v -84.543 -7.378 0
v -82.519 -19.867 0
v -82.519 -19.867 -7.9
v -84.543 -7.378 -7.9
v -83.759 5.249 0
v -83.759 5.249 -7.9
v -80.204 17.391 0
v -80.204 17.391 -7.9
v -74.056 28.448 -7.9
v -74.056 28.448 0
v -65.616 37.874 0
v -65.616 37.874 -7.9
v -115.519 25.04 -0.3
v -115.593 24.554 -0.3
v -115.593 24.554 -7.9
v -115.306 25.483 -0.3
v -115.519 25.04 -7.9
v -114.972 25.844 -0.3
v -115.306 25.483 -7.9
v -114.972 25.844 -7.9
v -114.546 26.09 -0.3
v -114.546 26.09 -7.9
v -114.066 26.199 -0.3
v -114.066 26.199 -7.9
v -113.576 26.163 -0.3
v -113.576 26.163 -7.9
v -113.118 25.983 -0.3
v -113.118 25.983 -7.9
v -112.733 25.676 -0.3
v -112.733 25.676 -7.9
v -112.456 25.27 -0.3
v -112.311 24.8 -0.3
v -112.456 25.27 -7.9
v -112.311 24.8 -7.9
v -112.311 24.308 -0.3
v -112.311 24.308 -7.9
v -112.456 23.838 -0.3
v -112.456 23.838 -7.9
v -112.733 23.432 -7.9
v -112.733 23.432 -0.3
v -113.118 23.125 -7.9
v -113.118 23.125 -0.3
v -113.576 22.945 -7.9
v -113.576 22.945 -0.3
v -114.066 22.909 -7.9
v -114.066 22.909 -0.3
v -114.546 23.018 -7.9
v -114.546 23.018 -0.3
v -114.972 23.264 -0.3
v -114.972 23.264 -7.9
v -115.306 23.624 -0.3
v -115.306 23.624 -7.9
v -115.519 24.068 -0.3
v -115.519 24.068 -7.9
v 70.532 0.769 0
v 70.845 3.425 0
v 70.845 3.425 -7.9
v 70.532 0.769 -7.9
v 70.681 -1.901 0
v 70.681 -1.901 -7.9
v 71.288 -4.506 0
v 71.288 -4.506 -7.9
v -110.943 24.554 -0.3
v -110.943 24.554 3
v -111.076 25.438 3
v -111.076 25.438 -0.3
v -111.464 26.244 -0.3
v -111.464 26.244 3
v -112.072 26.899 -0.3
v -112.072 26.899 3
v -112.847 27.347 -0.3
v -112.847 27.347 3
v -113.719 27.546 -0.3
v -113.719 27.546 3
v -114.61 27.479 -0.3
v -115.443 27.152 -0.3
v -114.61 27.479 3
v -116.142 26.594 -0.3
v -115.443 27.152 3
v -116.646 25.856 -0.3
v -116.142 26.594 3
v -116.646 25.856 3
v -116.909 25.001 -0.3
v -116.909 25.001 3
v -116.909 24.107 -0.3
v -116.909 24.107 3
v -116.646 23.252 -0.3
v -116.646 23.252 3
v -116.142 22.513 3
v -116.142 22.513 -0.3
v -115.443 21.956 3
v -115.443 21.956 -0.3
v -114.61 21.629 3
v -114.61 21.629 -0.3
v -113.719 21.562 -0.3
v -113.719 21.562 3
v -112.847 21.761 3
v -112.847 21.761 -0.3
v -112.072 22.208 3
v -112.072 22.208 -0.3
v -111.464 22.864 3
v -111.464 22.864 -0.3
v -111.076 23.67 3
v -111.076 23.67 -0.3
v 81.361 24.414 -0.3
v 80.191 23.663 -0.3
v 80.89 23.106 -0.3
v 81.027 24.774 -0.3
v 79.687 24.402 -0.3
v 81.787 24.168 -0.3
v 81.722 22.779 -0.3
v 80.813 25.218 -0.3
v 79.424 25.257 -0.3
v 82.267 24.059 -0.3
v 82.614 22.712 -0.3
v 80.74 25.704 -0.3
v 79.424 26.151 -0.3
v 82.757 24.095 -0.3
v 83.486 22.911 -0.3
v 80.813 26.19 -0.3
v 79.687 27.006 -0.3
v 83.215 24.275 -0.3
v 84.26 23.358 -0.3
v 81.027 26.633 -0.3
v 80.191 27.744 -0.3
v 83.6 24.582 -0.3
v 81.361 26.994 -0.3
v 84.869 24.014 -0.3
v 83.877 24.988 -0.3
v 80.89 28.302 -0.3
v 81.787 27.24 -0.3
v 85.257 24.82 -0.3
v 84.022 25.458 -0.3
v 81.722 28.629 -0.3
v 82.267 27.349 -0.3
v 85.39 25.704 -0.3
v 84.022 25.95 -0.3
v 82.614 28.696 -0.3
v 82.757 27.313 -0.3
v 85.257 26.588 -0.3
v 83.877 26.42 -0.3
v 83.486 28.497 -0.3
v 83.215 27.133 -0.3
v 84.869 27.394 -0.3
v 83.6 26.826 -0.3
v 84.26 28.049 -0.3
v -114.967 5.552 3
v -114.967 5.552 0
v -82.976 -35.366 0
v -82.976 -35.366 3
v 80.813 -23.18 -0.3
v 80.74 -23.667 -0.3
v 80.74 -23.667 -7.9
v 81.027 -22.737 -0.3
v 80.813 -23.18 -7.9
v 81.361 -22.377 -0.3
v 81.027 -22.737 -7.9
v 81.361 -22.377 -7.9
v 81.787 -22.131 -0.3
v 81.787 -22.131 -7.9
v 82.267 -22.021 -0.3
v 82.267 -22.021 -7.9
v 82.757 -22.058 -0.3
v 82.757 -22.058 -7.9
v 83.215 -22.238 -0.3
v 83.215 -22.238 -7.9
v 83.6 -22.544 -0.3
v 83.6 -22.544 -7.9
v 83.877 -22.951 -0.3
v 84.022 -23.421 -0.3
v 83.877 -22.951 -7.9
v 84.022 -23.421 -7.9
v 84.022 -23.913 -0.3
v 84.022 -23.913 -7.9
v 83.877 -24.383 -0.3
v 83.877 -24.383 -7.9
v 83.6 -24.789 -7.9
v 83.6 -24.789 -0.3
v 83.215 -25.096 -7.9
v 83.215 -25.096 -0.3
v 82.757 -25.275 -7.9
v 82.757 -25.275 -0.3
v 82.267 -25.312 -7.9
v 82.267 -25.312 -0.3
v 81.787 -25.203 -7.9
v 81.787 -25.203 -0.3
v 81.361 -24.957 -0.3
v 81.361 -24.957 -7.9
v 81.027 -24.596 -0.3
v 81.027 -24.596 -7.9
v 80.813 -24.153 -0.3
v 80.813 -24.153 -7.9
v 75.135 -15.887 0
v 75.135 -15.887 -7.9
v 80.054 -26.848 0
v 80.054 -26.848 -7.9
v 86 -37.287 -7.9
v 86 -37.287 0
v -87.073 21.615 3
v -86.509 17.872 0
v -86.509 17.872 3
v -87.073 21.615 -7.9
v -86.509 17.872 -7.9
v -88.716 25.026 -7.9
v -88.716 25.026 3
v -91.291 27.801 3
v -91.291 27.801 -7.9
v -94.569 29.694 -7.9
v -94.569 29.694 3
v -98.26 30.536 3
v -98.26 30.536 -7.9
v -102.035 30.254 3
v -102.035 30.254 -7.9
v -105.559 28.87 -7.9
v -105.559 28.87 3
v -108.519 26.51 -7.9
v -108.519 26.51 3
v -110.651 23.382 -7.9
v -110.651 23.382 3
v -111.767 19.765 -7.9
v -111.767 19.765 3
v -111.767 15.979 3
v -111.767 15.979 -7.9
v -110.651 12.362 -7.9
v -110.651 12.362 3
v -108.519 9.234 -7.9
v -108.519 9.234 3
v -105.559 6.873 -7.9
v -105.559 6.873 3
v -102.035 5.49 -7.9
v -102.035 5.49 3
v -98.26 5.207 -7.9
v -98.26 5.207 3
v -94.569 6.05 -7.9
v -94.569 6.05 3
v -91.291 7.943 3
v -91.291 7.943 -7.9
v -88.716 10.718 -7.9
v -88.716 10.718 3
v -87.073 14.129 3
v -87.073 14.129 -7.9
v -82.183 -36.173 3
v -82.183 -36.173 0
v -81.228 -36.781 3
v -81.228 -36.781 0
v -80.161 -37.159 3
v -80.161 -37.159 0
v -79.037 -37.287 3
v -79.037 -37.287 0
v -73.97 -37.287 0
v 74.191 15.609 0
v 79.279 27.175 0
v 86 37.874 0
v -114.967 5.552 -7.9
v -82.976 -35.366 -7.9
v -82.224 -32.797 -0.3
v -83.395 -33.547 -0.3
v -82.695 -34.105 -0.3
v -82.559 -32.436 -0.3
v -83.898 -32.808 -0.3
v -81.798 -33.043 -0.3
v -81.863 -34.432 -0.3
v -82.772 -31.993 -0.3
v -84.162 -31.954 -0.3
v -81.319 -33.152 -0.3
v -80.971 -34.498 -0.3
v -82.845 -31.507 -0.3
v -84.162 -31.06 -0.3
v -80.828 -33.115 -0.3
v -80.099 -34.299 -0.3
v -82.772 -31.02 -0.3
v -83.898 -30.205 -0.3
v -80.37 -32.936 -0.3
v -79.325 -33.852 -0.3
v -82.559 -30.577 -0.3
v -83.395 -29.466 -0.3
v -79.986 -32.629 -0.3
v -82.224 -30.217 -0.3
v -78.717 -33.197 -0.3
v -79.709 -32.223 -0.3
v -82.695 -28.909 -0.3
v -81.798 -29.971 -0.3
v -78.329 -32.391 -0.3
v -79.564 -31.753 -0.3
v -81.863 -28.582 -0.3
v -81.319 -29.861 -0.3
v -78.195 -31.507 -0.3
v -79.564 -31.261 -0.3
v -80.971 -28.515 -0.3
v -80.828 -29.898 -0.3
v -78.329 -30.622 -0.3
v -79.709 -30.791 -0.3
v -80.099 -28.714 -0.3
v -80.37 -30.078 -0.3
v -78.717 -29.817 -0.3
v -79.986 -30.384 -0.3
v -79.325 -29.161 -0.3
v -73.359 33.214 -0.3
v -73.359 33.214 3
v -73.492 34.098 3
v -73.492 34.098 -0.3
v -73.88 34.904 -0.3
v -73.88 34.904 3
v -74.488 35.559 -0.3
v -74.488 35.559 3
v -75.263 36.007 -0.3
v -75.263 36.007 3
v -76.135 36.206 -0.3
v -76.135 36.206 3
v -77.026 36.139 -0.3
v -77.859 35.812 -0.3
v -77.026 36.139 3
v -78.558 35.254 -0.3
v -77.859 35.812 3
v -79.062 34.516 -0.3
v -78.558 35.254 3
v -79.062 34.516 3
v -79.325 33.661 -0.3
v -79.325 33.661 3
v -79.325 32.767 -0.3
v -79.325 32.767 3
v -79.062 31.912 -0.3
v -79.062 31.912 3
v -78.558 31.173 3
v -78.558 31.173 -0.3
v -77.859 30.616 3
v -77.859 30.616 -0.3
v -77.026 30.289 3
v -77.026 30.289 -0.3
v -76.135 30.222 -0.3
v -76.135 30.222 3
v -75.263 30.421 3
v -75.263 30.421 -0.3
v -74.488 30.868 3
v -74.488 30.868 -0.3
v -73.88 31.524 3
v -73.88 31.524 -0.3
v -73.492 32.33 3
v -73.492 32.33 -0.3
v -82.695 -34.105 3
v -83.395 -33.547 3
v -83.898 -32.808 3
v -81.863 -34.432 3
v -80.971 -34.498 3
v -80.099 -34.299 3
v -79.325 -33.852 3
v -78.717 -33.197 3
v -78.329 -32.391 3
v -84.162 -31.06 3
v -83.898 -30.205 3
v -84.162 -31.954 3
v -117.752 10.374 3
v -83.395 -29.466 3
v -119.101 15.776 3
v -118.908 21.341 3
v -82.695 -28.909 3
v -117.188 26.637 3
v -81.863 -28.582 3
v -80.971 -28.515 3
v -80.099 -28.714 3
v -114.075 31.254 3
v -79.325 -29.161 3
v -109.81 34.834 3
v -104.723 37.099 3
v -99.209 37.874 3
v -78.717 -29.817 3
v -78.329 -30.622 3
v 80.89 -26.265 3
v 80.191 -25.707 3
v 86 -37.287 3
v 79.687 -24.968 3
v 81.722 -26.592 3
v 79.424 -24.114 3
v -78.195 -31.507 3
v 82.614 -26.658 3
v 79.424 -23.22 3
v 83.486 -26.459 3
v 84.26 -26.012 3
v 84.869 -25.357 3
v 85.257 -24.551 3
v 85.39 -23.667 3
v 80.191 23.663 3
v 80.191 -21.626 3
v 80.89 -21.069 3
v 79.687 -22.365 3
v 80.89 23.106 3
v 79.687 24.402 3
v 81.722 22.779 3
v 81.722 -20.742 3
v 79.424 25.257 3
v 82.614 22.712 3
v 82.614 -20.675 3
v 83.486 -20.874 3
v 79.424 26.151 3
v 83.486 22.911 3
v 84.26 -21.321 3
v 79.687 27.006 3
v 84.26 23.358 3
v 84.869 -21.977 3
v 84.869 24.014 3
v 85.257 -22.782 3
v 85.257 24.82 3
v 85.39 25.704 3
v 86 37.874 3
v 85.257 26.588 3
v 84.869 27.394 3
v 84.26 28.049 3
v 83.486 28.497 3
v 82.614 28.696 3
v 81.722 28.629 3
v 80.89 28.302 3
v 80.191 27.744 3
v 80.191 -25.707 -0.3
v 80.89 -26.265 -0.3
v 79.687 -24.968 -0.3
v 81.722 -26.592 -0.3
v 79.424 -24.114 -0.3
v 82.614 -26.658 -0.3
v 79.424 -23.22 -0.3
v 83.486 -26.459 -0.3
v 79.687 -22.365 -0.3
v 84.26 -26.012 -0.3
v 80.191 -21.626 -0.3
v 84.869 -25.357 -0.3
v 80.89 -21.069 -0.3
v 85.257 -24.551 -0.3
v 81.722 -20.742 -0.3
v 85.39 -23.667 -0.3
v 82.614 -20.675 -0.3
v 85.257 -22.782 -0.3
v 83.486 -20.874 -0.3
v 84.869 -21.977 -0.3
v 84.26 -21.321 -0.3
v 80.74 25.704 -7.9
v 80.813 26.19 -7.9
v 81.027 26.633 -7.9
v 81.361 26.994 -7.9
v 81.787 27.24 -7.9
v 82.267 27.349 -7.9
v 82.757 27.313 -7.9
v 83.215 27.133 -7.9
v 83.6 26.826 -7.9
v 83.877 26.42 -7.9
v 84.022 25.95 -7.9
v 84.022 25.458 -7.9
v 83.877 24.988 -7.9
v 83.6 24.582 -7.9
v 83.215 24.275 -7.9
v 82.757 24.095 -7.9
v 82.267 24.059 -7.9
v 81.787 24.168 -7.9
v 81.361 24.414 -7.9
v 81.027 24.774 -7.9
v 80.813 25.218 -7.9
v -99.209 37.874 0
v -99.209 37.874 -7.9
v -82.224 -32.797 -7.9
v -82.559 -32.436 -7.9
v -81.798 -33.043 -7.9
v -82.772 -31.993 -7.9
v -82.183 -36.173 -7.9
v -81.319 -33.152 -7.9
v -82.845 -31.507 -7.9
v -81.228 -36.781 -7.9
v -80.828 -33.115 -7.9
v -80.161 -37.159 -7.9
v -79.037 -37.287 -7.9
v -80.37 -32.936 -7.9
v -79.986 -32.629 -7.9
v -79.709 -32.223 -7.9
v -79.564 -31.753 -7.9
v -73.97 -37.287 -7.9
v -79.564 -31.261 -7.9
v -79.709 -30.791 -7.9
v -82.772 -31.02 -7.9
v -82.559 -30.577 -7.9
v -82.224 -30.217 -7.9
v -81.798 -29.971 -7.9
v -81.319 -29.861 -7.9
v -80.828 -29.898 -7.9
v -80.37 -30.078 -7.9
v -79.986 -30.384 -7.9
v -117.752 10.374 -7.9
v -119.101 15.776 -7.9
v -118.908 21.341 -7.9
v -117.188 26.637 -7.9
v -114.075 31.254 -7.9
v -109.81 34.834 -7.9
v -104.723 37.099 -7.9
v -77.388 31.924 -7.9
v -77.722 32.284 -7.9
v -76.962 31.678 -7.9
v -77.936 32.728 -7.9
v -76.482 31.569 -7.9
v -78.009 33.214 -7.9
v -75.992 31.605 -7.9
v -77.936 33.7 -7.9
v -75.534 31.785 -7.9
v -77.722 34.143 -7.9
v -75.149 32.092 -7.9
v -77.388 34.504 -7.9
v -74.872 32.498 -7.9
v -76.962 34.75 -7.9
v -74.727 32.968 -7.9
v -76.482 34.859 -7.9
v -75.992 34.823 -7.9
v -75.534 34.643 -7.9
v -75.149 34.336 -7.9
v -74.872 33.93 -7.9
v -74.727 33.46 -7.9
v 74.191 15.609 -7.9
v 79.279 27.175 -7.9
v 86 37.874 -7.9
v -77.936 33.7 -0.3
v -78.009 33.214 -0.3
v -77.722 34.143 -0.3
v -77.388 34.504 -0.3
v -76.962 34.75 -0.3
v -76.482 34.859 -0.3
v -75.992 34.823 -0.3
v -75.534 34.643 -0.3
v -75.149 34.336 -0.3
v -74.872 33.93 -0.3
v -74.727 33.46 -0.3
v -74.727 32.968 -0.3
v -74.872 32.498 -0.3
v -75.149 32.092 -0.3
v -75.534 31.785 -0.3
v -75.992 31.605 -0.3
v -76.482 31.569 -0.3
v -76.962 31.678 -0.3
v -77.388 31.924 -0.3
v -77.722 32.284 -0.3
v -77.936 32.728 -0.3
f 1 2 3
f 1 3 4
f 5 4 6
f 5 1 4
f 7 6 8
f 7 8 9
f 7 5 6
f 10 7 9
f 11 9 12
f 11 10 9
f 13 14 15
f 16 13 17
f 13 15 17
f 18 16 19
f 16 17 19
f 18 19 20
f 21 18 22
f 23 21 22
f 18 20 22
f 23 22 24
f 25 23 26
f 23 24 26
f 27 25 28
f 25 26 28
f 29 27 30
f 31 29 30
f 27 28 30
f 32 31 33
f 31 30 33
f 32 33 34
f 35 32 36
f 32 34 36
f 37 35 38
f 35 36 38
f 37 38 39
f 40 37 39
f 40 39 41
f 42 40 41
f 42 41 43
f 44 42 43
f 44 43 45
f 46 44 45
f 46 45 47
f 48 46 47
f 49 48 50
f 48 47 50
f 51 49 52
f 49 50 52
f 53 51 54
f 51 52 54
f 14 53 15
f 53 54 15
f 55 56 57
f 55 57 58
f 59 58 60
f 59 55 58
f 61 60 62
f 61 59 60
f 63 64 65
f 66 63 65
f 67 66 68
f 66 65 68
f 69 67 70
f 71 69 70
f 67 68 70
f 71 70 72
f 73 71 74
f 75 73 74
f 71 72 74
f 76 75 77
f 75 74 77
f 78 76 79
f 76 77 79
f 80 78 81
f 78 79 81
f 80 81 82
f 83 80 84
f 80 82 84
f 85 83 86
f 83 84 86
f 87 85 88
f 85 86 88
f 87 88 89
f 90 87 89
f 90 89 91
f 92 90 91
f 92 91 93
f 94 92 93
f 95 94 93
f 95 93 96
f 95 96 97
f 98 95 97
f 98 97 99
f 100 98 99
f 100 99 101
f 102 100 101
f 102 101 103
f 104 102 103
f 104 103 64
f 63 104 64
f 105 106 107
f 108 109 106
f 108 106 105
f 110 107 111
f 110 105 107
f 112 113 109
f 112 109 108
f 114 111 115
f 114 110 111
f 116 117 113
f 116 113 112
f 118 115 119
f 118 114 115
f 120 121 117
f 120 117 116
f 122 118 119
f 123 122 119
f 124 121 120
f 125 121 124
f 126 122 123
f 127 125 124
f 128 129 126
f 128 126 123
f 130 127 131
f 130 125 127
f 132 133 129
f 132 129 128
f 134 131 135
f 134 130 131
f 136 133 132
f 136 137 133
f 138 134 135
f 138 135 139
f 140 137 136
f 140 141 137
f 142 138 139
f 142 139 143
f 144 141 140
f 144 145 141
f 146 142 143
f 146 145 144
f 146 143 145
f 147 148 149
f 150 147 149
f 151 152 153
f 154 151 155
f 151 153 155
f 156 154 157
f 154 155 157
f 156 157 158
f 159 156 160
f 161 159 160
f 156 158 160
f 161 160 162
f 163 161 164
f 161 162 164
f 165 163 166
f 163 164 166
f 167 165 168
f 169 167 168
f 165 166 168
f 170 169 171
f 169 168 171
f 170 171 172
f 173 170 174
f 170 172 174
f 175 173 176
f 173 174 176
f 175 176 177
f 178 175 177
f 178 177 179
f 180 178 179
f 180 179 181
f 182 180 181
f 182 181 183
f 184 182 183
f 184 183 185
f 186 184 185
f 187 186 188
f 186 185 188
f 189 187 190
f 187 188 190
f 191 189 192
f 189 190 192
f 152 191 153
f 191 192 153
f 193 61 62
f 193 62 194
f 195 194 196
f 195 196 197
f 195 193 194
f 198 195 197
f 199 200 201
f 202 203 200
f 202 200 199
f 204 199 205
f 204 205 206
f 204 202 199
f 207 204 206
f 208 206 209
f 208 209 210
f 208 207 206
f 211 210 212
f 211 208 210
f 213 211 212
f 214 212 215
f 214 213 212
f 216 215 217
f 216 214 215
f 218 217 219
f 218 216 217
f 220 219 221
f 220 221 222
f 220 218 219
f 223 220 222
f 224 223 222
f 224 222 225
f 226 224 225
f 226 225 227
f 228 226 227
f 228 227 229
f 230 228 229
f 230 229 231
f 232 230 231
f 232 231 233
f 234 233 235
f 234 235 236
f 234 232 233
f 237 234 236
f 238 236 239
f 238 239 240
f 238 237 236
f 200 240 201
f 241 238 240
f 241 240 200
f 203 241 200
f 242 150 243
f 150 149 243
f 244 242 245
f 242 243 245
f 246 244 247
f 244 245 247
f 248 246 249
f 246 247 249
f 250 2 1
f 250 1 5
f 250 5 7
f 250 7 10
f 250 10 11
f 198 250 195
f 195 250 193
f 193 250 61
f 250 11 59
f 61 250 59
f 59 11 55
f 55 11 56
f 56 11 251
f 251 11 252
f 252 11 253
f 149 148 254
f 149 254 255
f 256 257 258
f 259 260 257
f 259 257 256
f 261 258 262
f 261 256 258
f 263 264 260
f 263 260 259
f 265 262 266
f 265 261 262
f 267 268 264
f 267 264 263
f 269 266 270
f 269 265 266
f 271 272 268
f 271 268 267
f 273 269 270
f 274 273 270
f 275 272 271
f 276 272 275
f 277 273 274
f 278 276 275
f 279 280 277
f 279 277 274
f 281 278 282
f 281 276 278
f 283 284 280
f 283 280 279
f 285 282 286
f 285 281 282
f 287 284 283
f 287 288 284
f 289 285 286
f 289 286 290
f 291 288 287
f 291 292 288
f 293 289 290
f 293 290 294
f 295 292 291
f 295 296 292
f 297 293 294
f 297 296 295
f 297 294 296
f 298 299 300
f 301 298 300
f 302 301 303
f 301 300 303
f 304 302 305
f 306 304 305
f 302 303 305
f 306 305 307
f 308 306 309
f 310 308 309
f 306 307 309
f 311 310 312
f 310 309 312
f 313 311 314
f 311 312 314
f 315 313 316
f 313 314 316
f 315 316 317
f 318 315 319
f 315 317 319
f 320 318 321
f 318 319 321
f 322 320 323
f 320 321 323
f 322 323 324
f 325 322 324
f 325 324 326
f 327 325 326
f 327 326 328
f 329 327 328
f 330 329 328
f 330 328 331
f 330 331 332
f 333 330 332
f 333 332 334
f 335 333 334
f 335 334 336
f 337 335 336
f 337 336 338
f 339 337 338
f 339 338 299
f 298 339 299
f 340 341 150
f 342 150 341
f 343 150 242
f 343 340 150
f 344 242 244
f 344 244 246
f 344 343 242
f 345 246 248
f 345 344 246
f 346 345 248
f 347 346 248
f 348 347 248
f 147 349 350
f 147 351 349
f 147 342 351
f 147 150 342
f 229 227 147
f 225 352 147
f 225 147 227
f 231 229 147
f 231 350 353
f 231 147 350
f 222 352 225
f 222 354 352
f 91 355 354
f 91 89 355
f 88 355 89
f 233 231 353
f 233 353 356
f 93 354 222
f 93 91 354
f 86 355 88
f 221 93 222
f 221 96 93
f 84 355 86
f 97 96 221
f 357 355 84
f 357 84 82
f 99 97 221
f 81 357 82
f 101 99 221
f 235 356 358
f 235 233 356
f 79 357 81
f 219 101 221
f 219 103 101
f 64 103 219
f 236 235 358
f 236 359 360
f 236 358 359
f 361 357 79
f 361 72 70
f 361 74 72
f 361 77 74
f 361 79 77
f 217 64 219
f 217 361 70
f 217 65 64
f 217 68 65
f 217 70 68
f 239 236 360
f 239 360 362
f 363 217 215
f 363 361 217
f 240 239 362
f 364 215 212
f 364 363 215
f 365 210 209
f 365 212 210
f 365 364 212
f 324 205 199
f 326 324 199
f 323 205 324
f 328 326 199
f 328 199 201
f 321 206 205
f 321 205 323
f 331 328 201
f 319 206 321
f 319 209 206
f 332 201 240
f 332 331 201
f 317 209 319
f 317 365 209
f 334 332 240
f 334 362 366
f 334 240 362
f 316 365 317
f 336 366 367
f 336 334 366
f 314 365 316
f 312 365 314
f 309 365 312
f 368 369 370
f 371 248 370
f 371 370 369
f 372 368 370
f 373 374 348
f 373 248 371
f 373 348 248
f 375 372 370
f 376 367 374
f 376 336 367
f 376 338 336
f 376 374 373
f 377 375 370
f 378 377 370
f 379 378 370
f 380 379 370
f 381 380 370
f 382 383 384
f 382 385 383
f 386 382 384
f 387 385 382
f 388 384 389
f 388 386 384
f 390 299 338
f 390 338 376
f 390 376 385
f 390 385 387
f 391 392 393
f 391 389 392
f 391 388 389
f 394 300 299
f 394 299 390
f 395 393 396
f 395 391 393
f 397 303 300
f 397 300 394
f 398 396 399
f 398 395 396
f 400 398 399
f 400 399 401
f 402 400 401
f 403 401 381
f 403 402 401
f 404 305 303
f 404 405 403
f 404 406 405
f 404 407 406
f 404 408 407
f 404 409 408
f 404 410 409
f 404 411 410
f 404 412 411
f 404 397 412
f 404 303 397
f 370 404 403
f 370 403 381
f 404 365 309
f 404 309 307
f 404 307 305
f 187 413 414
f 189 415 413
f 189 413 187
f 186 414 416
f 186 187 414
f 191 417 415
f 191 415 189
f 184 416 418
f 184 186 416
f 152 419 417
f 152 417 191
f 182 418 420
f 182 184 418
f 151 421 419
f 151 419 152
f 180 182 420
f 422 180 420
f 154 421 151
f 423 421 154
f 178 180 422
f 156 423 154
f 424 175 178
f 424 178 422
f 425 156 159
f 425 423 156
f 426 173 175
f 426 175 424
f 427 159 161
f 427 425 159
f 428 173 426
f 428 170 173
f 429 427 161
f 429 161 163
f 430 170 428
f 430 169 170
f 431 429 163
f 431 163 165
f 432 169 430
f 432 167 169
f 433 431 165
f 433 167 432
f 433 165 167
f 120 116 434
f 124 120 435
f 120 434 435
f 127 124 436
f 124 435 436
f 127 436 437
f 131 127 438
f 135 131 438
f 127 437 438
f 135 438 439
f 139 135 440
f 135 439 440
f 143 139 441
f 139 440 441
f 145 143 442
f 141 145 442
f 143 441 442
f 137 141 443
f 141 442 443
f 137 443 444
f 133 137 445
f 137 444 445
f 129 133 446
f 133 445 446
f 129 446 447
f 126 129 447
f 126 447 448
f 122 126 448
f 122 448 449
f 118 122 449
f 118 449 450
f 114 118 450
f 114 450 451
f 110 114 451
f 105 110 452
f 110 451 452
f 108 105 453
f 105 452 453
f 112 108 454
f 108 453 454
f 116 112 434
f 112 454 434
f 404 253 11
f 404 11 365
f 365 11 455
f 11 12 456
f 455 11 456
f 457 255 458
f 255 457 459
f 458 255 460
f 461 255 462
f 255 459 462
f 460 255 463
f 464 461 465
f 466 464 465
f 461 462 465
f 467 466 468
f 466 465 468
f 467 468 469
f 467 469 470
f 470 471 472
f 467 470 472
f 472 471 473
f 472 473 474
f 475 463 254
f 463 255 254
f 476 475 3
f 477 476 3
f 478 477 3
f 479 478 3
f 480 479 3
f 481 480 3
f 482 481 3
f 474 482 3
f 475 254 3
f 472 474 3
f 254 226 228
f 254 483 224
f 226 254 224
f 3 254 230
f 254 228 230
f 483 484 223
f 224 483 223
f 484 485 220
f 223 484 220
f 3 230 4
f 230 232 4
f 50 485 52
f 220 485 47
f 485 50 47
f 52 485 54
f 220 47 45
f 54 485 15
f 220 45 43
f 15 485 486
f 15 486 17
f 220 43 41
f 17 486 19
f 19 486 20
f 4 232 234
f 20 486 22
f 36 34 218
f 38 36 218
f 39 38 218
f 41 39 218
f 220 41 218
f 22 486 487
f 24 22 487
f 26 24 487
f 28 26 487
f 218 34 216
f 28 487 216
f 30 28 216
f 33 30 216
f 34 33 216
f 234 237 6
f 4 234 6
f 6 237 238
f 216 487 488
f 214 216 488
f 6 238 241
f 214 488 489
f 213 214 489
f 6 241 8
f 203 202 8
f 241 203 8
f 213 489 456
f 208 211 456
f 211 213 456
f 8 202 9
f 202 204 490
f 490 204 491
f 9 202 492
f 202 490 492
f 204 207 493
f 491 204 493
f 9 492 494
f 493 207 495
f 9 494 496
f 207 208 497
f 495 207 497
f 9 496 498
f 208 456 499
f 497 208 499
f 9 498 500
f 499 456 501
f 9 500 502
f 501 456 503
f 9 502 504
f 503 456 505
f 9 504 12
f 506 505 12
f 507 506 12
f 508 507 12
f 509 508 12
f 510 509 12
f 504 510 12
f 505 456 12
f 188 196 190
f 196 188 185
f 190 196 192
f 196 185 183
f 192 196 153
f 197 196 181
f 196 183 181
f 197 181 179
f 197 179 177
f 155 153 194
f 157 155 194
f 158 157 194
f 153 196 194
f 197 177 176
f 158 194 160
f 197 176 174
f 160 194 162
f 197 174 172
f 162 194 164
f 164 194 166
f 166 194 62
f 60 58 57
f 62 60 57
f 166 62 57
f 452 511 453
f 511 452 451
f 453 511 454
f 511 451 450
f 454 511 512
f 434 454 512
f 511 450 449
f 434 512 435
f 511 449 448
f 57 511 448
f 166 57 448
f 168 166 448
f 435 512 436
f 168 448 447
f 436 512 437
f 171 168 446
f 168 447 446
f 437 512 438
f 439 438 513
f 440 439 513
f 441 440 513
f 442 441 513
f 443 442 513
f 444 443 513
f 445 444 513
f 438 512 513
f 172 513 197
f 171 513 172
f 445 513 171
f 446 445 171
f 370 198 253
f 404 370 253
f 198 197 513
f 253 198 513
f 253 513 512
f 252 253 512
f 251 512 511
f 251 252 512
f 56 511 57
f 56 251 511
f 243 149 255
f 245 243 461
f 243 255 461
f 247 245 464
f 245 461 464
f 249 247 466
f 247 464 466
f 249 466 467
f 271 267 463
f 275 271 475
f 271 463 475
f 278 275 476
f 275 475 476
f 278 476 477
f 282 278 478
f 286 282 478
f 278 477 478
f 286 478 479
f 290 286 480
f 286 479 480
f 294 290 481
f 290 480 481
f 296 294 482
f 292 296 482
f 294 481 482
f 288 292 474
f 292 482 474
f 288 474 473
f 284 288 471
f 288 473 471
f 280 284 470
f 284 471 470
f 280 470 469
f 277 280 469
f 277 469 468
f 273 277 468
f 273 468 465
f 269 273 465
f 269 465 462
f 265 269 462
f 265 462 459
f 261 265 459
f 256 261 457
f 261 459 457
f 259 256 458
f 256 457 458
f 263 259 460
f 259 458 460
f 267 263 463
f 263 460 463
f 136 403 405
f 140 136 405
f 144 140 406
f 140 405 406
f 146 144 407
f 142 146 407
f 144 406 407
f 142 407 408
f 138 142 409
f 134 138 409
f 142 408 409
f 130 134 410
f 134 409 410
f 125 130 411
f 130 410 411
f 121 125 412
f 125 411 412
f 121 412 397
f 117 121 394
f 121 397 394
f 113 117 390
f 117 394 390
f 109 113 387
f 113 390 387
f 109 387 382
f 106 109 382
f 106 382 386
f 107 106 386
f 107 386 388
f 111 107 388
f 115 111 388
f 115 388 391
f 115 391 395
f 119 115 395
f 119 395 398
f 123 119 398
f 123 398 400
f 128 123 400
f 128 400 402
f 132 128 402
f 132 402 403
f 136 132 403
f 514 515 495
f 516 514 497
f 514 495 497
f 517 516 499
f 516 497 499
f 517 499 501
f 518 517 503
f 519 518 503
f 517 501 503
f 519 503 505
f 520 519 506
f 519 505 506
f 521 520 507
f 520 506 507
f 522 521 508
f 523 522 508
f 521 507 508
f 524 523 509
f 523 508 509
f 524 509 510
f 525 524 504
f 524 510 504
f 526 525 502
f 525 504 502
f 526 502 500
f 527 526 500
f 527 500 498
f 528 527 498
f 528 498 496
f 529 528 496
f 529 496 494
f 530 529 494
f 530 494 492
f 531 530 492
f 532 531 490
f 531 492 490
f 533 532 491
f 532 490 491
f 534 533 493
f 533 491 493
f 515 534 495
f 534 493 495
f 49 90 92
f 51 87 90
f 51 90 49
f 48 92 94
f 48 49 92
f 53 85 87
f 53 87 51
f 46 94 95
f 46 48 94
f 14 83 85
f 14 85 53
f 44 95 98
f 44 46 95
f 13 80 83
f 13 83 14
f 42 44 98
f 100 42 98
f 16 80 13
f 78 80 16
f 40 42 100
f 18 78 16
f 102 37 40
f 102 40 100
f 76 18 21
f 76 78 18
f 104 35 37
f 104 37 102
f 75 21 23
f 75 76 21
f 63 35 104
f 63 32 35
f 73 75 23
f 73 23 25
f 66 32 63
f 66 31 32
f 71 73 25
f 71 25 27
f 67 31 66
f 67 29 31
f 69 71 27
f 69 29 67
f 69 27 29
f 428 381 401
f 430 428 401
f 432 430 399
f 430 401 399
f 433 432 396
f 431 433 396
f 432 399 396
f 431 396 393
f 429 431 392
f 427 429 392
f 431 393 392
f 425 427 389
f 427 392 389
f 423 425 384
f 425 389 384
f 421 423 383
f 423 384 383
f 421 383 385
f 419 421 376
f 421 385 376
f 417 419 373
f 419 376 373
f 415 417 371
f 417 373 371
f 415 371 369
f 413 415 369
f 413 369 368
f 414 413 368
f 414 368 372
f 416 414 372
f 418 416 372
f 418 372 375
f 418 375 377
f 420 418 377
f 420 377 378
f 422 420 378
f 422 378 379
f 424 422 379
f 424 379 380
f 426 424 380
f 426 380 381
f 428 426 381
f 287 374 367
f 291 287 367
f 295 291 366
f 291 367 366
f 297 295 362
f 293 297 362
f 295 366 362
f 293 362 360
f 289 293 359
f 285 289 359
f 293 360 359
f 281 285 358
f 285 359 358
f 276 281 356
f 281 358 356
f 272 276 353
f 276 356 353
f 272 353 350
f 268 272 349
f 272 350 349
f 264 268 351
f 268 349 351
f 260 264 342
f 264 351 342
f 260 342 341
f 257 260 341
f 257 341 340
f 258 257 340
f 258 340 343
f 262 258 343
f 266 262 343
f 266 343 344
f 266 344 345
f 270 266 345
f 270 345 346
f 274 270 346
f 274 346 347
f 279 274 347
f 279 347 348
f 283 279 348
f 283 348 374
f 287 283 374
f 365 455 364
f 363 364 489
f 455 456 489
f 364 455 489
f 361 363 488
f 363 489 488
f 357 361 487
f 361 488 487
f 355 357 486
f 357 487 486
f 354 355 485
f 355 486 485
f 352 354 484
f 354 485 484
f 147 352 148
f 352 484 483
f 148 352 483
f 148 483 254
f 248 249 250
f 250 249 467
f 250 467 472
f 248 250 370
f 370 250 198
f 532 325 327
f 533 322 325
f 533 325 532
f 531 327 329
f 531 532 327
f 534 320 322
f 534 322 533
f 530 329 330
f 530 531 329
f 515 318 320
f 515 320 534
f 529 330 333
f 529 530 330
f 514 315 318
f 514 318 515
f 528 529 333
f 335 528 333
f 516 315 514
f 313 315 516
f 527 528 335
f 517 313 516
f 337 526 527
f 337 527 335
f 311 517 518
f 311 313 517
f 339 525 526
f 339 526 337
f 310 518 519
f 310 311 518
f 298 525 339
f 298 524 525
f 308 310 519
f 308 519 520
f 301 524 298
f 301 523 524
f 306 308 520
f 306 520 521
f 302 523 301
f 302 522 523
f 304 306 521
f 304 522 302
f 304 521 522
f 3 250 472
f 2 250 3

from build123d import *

# Parameters (mm, degrees)
F0_R           = 12.7
F1_DEPTH       = 7.9
F1_FACE_R      = 12.7
F2_DEPTH       = 3
F3_DEPTH       = 3
F4_R           = 5
F8_D           = 3.3
F8_CBORE_D     = 6
F8_CBORE_DEPTH = 3.3


# Not quite as in the source:
# - a feature names something its author has since deleted; it is built from what else it names


with BuildPart() as f1:
    # F0 (on Top) → F1 (new body)
    with BuildSketch(Plane.XY):
        with BuildLine():
            ThreePointArc((-82.519158721, -19.8666825891), (-82.3199649398, 11.4193737584), (-65.6162592679, 37.8739237785))
            Line((-65.6162592679, 37.8739237785), (-99.2088739193, 37.8739237785))
            ThreePointArc((-99.2088739193, 37.8739237785), (-117.1879721114, 26.6373104948), (-114.9666717313, 5.5523567478))
            Line((-114.9666717313, 5.5523567478), (-81.4747432756, -37.2867286205))
            Line((-81.4747432756, -37.2867286205), (-73.9695476283, -37.2867286205))
            Line((-73.9695476283, -37.2867286205), (-82.519158721, -19.8666825891))
        make_face()
        with Locations((-99.2088739193, 17.8719250206)):
            Circle(F0_R, mode=Mode.SUBTRACT)
    extrude(amount=-F1_DEPTH)



with BuildPart() as f1b:
    # F0 (on Top) → F1, piece 2 (new body)
    with BuildSketch(Plane.XY):
        with BuildLine():
            Line((86, -37.2867286205), (86, 37.8739237785))
            ThreePointArc((86, 37.8739237785), (76.5230858808, 21.4851908555), (70.8448413014, 3.4252903424))
            ThreePointArc((70.8448413014, 3.4252903424), (70.5487291916, -0.5692843065), (71.2877699379, -4.5060504646))
            ThreePointArc((71.2877699379, -4.5060504646), (77.4631412951, -21.4263167299), (86, -37.2867286205))
        make_face()
    extrude(amount=-F1_DEPTH)


with BuildPart() as f1_1:
    add(f1.part)

    add(f1b.part)  # F2 merges F1b
    # F0 (on Top) + F1_face (on face) → F2 (join)
    with BuildSketch(Plane.XY):
        with BuildLine():
            ThreePointArc((70.8448413014, 3.4252903424), (76.5230858808, 21.4851908555), (86, 37.8739237785))
            Line((86, 37.8739237785), (-65.6162592679, 37.8739237785))
            ThreePointArc((-65.6162592679, 37.8739237785), (-82.3199649398, 11.4193737584), (-82.519158721, -19.8666825891))
            Line((-82.519158721, -19.8666825891), (-73.9695476283, -37.2867286205))
            Line((-73.9695476283, -37.2867286205), (86, -37.2867286205))
            ThreePointArc((86, -37.2867286205), (77.4631412951, -21.4263167299), (71.2877699379, -4.5060504646))
            ThreePointArc((71.2877699379, -4.5060504646), (70.5487291916, -0.5692843065), (70.8448413014, 3.4252903424))
        make_face()
    with BuildSketch(Plane(origin=(-93.510683798, 7.7887517246, 0), x_dir=(1, 0, 0), z_dir=(0, 0, 1))):
        with BuildLine():
            ThreePointArc((10.9915250771, -27.6554343137), (11.1907188583, 3.6306220338), (27.8944245301, 30.0851720539))
            Line((27.8944245301, 30.0851720539), (-5.6981901212, 30.0851720539))
            ThreePointArc((-5.6981901212, 30.0851720539), (-23.6772883134, 18.8485587701), (-21.4559879333, -2.2363949769))
            Line((-21.4559879333, -2.2363949769), (12.0359405224, -45.0754803451))
            Line((12.0359405224, -45.0754803451), (19.5411361698, -45.0754803451))
            Line((19.5411361698, -45.0754803451), (10.9915250771, -27.6554343137))
        make_face()
        with Locations((-5.6981901212, 10.083173296)):
            Circle(F1_FACE_R, mode=Mode.SUBTRACT)
    extrude(amount=F2_DEPTH)

    # F4
    f4_edges = [f1_1.edges().sort_by_distance(p)[0] for p in [
        (-81.474743, -37.286729, -2.45),
    ]]
    fillet(f4_edges, radius=F4_R)


with BuildPart() as f3:
    # F0 (on Top) → F3 (new body)
    with BuildSketch(Plane.XY):
        with BuildLine():
            Line((86, -37.2867286205), (86, 37.8739237785))
            ThreePointArc((86, 37.8739237785), (76.5230858808, 21.4851908555), (70.8448413014, 3.4252903424))
            ThreePointArc((70.8448413014, 3.4252903424), (70.5487291916, -0.5692843065), (71.2877699379, -4.5060504646))
            ThreePointArc((71.2877699379, -4.5060504646), (77.4631412951, -21.4263167299), (86, -37.2867286205))
        make_face()
    extrude(amount=F3_DEPTH)


with BuildPart() as f1_2:
    add(f1_1.part)

    # F6: union F3
    add(f3.part)

    # F8 (through all)
    with Locations(Plane.XY.offset(3)):
        with Locations((-76.3588739193, 33.2139237785), (-113.9428039086, 24.5539237785), (-81.1954878403, -31.5067286205), (82.39, -23.6667286205), (82.39, 25.7039237785)):
            CounterBoreHole(F8_D / 2, F8_CBORE_D / 2, F8_CBORE_DEPTH)


solid = f1_2.part
